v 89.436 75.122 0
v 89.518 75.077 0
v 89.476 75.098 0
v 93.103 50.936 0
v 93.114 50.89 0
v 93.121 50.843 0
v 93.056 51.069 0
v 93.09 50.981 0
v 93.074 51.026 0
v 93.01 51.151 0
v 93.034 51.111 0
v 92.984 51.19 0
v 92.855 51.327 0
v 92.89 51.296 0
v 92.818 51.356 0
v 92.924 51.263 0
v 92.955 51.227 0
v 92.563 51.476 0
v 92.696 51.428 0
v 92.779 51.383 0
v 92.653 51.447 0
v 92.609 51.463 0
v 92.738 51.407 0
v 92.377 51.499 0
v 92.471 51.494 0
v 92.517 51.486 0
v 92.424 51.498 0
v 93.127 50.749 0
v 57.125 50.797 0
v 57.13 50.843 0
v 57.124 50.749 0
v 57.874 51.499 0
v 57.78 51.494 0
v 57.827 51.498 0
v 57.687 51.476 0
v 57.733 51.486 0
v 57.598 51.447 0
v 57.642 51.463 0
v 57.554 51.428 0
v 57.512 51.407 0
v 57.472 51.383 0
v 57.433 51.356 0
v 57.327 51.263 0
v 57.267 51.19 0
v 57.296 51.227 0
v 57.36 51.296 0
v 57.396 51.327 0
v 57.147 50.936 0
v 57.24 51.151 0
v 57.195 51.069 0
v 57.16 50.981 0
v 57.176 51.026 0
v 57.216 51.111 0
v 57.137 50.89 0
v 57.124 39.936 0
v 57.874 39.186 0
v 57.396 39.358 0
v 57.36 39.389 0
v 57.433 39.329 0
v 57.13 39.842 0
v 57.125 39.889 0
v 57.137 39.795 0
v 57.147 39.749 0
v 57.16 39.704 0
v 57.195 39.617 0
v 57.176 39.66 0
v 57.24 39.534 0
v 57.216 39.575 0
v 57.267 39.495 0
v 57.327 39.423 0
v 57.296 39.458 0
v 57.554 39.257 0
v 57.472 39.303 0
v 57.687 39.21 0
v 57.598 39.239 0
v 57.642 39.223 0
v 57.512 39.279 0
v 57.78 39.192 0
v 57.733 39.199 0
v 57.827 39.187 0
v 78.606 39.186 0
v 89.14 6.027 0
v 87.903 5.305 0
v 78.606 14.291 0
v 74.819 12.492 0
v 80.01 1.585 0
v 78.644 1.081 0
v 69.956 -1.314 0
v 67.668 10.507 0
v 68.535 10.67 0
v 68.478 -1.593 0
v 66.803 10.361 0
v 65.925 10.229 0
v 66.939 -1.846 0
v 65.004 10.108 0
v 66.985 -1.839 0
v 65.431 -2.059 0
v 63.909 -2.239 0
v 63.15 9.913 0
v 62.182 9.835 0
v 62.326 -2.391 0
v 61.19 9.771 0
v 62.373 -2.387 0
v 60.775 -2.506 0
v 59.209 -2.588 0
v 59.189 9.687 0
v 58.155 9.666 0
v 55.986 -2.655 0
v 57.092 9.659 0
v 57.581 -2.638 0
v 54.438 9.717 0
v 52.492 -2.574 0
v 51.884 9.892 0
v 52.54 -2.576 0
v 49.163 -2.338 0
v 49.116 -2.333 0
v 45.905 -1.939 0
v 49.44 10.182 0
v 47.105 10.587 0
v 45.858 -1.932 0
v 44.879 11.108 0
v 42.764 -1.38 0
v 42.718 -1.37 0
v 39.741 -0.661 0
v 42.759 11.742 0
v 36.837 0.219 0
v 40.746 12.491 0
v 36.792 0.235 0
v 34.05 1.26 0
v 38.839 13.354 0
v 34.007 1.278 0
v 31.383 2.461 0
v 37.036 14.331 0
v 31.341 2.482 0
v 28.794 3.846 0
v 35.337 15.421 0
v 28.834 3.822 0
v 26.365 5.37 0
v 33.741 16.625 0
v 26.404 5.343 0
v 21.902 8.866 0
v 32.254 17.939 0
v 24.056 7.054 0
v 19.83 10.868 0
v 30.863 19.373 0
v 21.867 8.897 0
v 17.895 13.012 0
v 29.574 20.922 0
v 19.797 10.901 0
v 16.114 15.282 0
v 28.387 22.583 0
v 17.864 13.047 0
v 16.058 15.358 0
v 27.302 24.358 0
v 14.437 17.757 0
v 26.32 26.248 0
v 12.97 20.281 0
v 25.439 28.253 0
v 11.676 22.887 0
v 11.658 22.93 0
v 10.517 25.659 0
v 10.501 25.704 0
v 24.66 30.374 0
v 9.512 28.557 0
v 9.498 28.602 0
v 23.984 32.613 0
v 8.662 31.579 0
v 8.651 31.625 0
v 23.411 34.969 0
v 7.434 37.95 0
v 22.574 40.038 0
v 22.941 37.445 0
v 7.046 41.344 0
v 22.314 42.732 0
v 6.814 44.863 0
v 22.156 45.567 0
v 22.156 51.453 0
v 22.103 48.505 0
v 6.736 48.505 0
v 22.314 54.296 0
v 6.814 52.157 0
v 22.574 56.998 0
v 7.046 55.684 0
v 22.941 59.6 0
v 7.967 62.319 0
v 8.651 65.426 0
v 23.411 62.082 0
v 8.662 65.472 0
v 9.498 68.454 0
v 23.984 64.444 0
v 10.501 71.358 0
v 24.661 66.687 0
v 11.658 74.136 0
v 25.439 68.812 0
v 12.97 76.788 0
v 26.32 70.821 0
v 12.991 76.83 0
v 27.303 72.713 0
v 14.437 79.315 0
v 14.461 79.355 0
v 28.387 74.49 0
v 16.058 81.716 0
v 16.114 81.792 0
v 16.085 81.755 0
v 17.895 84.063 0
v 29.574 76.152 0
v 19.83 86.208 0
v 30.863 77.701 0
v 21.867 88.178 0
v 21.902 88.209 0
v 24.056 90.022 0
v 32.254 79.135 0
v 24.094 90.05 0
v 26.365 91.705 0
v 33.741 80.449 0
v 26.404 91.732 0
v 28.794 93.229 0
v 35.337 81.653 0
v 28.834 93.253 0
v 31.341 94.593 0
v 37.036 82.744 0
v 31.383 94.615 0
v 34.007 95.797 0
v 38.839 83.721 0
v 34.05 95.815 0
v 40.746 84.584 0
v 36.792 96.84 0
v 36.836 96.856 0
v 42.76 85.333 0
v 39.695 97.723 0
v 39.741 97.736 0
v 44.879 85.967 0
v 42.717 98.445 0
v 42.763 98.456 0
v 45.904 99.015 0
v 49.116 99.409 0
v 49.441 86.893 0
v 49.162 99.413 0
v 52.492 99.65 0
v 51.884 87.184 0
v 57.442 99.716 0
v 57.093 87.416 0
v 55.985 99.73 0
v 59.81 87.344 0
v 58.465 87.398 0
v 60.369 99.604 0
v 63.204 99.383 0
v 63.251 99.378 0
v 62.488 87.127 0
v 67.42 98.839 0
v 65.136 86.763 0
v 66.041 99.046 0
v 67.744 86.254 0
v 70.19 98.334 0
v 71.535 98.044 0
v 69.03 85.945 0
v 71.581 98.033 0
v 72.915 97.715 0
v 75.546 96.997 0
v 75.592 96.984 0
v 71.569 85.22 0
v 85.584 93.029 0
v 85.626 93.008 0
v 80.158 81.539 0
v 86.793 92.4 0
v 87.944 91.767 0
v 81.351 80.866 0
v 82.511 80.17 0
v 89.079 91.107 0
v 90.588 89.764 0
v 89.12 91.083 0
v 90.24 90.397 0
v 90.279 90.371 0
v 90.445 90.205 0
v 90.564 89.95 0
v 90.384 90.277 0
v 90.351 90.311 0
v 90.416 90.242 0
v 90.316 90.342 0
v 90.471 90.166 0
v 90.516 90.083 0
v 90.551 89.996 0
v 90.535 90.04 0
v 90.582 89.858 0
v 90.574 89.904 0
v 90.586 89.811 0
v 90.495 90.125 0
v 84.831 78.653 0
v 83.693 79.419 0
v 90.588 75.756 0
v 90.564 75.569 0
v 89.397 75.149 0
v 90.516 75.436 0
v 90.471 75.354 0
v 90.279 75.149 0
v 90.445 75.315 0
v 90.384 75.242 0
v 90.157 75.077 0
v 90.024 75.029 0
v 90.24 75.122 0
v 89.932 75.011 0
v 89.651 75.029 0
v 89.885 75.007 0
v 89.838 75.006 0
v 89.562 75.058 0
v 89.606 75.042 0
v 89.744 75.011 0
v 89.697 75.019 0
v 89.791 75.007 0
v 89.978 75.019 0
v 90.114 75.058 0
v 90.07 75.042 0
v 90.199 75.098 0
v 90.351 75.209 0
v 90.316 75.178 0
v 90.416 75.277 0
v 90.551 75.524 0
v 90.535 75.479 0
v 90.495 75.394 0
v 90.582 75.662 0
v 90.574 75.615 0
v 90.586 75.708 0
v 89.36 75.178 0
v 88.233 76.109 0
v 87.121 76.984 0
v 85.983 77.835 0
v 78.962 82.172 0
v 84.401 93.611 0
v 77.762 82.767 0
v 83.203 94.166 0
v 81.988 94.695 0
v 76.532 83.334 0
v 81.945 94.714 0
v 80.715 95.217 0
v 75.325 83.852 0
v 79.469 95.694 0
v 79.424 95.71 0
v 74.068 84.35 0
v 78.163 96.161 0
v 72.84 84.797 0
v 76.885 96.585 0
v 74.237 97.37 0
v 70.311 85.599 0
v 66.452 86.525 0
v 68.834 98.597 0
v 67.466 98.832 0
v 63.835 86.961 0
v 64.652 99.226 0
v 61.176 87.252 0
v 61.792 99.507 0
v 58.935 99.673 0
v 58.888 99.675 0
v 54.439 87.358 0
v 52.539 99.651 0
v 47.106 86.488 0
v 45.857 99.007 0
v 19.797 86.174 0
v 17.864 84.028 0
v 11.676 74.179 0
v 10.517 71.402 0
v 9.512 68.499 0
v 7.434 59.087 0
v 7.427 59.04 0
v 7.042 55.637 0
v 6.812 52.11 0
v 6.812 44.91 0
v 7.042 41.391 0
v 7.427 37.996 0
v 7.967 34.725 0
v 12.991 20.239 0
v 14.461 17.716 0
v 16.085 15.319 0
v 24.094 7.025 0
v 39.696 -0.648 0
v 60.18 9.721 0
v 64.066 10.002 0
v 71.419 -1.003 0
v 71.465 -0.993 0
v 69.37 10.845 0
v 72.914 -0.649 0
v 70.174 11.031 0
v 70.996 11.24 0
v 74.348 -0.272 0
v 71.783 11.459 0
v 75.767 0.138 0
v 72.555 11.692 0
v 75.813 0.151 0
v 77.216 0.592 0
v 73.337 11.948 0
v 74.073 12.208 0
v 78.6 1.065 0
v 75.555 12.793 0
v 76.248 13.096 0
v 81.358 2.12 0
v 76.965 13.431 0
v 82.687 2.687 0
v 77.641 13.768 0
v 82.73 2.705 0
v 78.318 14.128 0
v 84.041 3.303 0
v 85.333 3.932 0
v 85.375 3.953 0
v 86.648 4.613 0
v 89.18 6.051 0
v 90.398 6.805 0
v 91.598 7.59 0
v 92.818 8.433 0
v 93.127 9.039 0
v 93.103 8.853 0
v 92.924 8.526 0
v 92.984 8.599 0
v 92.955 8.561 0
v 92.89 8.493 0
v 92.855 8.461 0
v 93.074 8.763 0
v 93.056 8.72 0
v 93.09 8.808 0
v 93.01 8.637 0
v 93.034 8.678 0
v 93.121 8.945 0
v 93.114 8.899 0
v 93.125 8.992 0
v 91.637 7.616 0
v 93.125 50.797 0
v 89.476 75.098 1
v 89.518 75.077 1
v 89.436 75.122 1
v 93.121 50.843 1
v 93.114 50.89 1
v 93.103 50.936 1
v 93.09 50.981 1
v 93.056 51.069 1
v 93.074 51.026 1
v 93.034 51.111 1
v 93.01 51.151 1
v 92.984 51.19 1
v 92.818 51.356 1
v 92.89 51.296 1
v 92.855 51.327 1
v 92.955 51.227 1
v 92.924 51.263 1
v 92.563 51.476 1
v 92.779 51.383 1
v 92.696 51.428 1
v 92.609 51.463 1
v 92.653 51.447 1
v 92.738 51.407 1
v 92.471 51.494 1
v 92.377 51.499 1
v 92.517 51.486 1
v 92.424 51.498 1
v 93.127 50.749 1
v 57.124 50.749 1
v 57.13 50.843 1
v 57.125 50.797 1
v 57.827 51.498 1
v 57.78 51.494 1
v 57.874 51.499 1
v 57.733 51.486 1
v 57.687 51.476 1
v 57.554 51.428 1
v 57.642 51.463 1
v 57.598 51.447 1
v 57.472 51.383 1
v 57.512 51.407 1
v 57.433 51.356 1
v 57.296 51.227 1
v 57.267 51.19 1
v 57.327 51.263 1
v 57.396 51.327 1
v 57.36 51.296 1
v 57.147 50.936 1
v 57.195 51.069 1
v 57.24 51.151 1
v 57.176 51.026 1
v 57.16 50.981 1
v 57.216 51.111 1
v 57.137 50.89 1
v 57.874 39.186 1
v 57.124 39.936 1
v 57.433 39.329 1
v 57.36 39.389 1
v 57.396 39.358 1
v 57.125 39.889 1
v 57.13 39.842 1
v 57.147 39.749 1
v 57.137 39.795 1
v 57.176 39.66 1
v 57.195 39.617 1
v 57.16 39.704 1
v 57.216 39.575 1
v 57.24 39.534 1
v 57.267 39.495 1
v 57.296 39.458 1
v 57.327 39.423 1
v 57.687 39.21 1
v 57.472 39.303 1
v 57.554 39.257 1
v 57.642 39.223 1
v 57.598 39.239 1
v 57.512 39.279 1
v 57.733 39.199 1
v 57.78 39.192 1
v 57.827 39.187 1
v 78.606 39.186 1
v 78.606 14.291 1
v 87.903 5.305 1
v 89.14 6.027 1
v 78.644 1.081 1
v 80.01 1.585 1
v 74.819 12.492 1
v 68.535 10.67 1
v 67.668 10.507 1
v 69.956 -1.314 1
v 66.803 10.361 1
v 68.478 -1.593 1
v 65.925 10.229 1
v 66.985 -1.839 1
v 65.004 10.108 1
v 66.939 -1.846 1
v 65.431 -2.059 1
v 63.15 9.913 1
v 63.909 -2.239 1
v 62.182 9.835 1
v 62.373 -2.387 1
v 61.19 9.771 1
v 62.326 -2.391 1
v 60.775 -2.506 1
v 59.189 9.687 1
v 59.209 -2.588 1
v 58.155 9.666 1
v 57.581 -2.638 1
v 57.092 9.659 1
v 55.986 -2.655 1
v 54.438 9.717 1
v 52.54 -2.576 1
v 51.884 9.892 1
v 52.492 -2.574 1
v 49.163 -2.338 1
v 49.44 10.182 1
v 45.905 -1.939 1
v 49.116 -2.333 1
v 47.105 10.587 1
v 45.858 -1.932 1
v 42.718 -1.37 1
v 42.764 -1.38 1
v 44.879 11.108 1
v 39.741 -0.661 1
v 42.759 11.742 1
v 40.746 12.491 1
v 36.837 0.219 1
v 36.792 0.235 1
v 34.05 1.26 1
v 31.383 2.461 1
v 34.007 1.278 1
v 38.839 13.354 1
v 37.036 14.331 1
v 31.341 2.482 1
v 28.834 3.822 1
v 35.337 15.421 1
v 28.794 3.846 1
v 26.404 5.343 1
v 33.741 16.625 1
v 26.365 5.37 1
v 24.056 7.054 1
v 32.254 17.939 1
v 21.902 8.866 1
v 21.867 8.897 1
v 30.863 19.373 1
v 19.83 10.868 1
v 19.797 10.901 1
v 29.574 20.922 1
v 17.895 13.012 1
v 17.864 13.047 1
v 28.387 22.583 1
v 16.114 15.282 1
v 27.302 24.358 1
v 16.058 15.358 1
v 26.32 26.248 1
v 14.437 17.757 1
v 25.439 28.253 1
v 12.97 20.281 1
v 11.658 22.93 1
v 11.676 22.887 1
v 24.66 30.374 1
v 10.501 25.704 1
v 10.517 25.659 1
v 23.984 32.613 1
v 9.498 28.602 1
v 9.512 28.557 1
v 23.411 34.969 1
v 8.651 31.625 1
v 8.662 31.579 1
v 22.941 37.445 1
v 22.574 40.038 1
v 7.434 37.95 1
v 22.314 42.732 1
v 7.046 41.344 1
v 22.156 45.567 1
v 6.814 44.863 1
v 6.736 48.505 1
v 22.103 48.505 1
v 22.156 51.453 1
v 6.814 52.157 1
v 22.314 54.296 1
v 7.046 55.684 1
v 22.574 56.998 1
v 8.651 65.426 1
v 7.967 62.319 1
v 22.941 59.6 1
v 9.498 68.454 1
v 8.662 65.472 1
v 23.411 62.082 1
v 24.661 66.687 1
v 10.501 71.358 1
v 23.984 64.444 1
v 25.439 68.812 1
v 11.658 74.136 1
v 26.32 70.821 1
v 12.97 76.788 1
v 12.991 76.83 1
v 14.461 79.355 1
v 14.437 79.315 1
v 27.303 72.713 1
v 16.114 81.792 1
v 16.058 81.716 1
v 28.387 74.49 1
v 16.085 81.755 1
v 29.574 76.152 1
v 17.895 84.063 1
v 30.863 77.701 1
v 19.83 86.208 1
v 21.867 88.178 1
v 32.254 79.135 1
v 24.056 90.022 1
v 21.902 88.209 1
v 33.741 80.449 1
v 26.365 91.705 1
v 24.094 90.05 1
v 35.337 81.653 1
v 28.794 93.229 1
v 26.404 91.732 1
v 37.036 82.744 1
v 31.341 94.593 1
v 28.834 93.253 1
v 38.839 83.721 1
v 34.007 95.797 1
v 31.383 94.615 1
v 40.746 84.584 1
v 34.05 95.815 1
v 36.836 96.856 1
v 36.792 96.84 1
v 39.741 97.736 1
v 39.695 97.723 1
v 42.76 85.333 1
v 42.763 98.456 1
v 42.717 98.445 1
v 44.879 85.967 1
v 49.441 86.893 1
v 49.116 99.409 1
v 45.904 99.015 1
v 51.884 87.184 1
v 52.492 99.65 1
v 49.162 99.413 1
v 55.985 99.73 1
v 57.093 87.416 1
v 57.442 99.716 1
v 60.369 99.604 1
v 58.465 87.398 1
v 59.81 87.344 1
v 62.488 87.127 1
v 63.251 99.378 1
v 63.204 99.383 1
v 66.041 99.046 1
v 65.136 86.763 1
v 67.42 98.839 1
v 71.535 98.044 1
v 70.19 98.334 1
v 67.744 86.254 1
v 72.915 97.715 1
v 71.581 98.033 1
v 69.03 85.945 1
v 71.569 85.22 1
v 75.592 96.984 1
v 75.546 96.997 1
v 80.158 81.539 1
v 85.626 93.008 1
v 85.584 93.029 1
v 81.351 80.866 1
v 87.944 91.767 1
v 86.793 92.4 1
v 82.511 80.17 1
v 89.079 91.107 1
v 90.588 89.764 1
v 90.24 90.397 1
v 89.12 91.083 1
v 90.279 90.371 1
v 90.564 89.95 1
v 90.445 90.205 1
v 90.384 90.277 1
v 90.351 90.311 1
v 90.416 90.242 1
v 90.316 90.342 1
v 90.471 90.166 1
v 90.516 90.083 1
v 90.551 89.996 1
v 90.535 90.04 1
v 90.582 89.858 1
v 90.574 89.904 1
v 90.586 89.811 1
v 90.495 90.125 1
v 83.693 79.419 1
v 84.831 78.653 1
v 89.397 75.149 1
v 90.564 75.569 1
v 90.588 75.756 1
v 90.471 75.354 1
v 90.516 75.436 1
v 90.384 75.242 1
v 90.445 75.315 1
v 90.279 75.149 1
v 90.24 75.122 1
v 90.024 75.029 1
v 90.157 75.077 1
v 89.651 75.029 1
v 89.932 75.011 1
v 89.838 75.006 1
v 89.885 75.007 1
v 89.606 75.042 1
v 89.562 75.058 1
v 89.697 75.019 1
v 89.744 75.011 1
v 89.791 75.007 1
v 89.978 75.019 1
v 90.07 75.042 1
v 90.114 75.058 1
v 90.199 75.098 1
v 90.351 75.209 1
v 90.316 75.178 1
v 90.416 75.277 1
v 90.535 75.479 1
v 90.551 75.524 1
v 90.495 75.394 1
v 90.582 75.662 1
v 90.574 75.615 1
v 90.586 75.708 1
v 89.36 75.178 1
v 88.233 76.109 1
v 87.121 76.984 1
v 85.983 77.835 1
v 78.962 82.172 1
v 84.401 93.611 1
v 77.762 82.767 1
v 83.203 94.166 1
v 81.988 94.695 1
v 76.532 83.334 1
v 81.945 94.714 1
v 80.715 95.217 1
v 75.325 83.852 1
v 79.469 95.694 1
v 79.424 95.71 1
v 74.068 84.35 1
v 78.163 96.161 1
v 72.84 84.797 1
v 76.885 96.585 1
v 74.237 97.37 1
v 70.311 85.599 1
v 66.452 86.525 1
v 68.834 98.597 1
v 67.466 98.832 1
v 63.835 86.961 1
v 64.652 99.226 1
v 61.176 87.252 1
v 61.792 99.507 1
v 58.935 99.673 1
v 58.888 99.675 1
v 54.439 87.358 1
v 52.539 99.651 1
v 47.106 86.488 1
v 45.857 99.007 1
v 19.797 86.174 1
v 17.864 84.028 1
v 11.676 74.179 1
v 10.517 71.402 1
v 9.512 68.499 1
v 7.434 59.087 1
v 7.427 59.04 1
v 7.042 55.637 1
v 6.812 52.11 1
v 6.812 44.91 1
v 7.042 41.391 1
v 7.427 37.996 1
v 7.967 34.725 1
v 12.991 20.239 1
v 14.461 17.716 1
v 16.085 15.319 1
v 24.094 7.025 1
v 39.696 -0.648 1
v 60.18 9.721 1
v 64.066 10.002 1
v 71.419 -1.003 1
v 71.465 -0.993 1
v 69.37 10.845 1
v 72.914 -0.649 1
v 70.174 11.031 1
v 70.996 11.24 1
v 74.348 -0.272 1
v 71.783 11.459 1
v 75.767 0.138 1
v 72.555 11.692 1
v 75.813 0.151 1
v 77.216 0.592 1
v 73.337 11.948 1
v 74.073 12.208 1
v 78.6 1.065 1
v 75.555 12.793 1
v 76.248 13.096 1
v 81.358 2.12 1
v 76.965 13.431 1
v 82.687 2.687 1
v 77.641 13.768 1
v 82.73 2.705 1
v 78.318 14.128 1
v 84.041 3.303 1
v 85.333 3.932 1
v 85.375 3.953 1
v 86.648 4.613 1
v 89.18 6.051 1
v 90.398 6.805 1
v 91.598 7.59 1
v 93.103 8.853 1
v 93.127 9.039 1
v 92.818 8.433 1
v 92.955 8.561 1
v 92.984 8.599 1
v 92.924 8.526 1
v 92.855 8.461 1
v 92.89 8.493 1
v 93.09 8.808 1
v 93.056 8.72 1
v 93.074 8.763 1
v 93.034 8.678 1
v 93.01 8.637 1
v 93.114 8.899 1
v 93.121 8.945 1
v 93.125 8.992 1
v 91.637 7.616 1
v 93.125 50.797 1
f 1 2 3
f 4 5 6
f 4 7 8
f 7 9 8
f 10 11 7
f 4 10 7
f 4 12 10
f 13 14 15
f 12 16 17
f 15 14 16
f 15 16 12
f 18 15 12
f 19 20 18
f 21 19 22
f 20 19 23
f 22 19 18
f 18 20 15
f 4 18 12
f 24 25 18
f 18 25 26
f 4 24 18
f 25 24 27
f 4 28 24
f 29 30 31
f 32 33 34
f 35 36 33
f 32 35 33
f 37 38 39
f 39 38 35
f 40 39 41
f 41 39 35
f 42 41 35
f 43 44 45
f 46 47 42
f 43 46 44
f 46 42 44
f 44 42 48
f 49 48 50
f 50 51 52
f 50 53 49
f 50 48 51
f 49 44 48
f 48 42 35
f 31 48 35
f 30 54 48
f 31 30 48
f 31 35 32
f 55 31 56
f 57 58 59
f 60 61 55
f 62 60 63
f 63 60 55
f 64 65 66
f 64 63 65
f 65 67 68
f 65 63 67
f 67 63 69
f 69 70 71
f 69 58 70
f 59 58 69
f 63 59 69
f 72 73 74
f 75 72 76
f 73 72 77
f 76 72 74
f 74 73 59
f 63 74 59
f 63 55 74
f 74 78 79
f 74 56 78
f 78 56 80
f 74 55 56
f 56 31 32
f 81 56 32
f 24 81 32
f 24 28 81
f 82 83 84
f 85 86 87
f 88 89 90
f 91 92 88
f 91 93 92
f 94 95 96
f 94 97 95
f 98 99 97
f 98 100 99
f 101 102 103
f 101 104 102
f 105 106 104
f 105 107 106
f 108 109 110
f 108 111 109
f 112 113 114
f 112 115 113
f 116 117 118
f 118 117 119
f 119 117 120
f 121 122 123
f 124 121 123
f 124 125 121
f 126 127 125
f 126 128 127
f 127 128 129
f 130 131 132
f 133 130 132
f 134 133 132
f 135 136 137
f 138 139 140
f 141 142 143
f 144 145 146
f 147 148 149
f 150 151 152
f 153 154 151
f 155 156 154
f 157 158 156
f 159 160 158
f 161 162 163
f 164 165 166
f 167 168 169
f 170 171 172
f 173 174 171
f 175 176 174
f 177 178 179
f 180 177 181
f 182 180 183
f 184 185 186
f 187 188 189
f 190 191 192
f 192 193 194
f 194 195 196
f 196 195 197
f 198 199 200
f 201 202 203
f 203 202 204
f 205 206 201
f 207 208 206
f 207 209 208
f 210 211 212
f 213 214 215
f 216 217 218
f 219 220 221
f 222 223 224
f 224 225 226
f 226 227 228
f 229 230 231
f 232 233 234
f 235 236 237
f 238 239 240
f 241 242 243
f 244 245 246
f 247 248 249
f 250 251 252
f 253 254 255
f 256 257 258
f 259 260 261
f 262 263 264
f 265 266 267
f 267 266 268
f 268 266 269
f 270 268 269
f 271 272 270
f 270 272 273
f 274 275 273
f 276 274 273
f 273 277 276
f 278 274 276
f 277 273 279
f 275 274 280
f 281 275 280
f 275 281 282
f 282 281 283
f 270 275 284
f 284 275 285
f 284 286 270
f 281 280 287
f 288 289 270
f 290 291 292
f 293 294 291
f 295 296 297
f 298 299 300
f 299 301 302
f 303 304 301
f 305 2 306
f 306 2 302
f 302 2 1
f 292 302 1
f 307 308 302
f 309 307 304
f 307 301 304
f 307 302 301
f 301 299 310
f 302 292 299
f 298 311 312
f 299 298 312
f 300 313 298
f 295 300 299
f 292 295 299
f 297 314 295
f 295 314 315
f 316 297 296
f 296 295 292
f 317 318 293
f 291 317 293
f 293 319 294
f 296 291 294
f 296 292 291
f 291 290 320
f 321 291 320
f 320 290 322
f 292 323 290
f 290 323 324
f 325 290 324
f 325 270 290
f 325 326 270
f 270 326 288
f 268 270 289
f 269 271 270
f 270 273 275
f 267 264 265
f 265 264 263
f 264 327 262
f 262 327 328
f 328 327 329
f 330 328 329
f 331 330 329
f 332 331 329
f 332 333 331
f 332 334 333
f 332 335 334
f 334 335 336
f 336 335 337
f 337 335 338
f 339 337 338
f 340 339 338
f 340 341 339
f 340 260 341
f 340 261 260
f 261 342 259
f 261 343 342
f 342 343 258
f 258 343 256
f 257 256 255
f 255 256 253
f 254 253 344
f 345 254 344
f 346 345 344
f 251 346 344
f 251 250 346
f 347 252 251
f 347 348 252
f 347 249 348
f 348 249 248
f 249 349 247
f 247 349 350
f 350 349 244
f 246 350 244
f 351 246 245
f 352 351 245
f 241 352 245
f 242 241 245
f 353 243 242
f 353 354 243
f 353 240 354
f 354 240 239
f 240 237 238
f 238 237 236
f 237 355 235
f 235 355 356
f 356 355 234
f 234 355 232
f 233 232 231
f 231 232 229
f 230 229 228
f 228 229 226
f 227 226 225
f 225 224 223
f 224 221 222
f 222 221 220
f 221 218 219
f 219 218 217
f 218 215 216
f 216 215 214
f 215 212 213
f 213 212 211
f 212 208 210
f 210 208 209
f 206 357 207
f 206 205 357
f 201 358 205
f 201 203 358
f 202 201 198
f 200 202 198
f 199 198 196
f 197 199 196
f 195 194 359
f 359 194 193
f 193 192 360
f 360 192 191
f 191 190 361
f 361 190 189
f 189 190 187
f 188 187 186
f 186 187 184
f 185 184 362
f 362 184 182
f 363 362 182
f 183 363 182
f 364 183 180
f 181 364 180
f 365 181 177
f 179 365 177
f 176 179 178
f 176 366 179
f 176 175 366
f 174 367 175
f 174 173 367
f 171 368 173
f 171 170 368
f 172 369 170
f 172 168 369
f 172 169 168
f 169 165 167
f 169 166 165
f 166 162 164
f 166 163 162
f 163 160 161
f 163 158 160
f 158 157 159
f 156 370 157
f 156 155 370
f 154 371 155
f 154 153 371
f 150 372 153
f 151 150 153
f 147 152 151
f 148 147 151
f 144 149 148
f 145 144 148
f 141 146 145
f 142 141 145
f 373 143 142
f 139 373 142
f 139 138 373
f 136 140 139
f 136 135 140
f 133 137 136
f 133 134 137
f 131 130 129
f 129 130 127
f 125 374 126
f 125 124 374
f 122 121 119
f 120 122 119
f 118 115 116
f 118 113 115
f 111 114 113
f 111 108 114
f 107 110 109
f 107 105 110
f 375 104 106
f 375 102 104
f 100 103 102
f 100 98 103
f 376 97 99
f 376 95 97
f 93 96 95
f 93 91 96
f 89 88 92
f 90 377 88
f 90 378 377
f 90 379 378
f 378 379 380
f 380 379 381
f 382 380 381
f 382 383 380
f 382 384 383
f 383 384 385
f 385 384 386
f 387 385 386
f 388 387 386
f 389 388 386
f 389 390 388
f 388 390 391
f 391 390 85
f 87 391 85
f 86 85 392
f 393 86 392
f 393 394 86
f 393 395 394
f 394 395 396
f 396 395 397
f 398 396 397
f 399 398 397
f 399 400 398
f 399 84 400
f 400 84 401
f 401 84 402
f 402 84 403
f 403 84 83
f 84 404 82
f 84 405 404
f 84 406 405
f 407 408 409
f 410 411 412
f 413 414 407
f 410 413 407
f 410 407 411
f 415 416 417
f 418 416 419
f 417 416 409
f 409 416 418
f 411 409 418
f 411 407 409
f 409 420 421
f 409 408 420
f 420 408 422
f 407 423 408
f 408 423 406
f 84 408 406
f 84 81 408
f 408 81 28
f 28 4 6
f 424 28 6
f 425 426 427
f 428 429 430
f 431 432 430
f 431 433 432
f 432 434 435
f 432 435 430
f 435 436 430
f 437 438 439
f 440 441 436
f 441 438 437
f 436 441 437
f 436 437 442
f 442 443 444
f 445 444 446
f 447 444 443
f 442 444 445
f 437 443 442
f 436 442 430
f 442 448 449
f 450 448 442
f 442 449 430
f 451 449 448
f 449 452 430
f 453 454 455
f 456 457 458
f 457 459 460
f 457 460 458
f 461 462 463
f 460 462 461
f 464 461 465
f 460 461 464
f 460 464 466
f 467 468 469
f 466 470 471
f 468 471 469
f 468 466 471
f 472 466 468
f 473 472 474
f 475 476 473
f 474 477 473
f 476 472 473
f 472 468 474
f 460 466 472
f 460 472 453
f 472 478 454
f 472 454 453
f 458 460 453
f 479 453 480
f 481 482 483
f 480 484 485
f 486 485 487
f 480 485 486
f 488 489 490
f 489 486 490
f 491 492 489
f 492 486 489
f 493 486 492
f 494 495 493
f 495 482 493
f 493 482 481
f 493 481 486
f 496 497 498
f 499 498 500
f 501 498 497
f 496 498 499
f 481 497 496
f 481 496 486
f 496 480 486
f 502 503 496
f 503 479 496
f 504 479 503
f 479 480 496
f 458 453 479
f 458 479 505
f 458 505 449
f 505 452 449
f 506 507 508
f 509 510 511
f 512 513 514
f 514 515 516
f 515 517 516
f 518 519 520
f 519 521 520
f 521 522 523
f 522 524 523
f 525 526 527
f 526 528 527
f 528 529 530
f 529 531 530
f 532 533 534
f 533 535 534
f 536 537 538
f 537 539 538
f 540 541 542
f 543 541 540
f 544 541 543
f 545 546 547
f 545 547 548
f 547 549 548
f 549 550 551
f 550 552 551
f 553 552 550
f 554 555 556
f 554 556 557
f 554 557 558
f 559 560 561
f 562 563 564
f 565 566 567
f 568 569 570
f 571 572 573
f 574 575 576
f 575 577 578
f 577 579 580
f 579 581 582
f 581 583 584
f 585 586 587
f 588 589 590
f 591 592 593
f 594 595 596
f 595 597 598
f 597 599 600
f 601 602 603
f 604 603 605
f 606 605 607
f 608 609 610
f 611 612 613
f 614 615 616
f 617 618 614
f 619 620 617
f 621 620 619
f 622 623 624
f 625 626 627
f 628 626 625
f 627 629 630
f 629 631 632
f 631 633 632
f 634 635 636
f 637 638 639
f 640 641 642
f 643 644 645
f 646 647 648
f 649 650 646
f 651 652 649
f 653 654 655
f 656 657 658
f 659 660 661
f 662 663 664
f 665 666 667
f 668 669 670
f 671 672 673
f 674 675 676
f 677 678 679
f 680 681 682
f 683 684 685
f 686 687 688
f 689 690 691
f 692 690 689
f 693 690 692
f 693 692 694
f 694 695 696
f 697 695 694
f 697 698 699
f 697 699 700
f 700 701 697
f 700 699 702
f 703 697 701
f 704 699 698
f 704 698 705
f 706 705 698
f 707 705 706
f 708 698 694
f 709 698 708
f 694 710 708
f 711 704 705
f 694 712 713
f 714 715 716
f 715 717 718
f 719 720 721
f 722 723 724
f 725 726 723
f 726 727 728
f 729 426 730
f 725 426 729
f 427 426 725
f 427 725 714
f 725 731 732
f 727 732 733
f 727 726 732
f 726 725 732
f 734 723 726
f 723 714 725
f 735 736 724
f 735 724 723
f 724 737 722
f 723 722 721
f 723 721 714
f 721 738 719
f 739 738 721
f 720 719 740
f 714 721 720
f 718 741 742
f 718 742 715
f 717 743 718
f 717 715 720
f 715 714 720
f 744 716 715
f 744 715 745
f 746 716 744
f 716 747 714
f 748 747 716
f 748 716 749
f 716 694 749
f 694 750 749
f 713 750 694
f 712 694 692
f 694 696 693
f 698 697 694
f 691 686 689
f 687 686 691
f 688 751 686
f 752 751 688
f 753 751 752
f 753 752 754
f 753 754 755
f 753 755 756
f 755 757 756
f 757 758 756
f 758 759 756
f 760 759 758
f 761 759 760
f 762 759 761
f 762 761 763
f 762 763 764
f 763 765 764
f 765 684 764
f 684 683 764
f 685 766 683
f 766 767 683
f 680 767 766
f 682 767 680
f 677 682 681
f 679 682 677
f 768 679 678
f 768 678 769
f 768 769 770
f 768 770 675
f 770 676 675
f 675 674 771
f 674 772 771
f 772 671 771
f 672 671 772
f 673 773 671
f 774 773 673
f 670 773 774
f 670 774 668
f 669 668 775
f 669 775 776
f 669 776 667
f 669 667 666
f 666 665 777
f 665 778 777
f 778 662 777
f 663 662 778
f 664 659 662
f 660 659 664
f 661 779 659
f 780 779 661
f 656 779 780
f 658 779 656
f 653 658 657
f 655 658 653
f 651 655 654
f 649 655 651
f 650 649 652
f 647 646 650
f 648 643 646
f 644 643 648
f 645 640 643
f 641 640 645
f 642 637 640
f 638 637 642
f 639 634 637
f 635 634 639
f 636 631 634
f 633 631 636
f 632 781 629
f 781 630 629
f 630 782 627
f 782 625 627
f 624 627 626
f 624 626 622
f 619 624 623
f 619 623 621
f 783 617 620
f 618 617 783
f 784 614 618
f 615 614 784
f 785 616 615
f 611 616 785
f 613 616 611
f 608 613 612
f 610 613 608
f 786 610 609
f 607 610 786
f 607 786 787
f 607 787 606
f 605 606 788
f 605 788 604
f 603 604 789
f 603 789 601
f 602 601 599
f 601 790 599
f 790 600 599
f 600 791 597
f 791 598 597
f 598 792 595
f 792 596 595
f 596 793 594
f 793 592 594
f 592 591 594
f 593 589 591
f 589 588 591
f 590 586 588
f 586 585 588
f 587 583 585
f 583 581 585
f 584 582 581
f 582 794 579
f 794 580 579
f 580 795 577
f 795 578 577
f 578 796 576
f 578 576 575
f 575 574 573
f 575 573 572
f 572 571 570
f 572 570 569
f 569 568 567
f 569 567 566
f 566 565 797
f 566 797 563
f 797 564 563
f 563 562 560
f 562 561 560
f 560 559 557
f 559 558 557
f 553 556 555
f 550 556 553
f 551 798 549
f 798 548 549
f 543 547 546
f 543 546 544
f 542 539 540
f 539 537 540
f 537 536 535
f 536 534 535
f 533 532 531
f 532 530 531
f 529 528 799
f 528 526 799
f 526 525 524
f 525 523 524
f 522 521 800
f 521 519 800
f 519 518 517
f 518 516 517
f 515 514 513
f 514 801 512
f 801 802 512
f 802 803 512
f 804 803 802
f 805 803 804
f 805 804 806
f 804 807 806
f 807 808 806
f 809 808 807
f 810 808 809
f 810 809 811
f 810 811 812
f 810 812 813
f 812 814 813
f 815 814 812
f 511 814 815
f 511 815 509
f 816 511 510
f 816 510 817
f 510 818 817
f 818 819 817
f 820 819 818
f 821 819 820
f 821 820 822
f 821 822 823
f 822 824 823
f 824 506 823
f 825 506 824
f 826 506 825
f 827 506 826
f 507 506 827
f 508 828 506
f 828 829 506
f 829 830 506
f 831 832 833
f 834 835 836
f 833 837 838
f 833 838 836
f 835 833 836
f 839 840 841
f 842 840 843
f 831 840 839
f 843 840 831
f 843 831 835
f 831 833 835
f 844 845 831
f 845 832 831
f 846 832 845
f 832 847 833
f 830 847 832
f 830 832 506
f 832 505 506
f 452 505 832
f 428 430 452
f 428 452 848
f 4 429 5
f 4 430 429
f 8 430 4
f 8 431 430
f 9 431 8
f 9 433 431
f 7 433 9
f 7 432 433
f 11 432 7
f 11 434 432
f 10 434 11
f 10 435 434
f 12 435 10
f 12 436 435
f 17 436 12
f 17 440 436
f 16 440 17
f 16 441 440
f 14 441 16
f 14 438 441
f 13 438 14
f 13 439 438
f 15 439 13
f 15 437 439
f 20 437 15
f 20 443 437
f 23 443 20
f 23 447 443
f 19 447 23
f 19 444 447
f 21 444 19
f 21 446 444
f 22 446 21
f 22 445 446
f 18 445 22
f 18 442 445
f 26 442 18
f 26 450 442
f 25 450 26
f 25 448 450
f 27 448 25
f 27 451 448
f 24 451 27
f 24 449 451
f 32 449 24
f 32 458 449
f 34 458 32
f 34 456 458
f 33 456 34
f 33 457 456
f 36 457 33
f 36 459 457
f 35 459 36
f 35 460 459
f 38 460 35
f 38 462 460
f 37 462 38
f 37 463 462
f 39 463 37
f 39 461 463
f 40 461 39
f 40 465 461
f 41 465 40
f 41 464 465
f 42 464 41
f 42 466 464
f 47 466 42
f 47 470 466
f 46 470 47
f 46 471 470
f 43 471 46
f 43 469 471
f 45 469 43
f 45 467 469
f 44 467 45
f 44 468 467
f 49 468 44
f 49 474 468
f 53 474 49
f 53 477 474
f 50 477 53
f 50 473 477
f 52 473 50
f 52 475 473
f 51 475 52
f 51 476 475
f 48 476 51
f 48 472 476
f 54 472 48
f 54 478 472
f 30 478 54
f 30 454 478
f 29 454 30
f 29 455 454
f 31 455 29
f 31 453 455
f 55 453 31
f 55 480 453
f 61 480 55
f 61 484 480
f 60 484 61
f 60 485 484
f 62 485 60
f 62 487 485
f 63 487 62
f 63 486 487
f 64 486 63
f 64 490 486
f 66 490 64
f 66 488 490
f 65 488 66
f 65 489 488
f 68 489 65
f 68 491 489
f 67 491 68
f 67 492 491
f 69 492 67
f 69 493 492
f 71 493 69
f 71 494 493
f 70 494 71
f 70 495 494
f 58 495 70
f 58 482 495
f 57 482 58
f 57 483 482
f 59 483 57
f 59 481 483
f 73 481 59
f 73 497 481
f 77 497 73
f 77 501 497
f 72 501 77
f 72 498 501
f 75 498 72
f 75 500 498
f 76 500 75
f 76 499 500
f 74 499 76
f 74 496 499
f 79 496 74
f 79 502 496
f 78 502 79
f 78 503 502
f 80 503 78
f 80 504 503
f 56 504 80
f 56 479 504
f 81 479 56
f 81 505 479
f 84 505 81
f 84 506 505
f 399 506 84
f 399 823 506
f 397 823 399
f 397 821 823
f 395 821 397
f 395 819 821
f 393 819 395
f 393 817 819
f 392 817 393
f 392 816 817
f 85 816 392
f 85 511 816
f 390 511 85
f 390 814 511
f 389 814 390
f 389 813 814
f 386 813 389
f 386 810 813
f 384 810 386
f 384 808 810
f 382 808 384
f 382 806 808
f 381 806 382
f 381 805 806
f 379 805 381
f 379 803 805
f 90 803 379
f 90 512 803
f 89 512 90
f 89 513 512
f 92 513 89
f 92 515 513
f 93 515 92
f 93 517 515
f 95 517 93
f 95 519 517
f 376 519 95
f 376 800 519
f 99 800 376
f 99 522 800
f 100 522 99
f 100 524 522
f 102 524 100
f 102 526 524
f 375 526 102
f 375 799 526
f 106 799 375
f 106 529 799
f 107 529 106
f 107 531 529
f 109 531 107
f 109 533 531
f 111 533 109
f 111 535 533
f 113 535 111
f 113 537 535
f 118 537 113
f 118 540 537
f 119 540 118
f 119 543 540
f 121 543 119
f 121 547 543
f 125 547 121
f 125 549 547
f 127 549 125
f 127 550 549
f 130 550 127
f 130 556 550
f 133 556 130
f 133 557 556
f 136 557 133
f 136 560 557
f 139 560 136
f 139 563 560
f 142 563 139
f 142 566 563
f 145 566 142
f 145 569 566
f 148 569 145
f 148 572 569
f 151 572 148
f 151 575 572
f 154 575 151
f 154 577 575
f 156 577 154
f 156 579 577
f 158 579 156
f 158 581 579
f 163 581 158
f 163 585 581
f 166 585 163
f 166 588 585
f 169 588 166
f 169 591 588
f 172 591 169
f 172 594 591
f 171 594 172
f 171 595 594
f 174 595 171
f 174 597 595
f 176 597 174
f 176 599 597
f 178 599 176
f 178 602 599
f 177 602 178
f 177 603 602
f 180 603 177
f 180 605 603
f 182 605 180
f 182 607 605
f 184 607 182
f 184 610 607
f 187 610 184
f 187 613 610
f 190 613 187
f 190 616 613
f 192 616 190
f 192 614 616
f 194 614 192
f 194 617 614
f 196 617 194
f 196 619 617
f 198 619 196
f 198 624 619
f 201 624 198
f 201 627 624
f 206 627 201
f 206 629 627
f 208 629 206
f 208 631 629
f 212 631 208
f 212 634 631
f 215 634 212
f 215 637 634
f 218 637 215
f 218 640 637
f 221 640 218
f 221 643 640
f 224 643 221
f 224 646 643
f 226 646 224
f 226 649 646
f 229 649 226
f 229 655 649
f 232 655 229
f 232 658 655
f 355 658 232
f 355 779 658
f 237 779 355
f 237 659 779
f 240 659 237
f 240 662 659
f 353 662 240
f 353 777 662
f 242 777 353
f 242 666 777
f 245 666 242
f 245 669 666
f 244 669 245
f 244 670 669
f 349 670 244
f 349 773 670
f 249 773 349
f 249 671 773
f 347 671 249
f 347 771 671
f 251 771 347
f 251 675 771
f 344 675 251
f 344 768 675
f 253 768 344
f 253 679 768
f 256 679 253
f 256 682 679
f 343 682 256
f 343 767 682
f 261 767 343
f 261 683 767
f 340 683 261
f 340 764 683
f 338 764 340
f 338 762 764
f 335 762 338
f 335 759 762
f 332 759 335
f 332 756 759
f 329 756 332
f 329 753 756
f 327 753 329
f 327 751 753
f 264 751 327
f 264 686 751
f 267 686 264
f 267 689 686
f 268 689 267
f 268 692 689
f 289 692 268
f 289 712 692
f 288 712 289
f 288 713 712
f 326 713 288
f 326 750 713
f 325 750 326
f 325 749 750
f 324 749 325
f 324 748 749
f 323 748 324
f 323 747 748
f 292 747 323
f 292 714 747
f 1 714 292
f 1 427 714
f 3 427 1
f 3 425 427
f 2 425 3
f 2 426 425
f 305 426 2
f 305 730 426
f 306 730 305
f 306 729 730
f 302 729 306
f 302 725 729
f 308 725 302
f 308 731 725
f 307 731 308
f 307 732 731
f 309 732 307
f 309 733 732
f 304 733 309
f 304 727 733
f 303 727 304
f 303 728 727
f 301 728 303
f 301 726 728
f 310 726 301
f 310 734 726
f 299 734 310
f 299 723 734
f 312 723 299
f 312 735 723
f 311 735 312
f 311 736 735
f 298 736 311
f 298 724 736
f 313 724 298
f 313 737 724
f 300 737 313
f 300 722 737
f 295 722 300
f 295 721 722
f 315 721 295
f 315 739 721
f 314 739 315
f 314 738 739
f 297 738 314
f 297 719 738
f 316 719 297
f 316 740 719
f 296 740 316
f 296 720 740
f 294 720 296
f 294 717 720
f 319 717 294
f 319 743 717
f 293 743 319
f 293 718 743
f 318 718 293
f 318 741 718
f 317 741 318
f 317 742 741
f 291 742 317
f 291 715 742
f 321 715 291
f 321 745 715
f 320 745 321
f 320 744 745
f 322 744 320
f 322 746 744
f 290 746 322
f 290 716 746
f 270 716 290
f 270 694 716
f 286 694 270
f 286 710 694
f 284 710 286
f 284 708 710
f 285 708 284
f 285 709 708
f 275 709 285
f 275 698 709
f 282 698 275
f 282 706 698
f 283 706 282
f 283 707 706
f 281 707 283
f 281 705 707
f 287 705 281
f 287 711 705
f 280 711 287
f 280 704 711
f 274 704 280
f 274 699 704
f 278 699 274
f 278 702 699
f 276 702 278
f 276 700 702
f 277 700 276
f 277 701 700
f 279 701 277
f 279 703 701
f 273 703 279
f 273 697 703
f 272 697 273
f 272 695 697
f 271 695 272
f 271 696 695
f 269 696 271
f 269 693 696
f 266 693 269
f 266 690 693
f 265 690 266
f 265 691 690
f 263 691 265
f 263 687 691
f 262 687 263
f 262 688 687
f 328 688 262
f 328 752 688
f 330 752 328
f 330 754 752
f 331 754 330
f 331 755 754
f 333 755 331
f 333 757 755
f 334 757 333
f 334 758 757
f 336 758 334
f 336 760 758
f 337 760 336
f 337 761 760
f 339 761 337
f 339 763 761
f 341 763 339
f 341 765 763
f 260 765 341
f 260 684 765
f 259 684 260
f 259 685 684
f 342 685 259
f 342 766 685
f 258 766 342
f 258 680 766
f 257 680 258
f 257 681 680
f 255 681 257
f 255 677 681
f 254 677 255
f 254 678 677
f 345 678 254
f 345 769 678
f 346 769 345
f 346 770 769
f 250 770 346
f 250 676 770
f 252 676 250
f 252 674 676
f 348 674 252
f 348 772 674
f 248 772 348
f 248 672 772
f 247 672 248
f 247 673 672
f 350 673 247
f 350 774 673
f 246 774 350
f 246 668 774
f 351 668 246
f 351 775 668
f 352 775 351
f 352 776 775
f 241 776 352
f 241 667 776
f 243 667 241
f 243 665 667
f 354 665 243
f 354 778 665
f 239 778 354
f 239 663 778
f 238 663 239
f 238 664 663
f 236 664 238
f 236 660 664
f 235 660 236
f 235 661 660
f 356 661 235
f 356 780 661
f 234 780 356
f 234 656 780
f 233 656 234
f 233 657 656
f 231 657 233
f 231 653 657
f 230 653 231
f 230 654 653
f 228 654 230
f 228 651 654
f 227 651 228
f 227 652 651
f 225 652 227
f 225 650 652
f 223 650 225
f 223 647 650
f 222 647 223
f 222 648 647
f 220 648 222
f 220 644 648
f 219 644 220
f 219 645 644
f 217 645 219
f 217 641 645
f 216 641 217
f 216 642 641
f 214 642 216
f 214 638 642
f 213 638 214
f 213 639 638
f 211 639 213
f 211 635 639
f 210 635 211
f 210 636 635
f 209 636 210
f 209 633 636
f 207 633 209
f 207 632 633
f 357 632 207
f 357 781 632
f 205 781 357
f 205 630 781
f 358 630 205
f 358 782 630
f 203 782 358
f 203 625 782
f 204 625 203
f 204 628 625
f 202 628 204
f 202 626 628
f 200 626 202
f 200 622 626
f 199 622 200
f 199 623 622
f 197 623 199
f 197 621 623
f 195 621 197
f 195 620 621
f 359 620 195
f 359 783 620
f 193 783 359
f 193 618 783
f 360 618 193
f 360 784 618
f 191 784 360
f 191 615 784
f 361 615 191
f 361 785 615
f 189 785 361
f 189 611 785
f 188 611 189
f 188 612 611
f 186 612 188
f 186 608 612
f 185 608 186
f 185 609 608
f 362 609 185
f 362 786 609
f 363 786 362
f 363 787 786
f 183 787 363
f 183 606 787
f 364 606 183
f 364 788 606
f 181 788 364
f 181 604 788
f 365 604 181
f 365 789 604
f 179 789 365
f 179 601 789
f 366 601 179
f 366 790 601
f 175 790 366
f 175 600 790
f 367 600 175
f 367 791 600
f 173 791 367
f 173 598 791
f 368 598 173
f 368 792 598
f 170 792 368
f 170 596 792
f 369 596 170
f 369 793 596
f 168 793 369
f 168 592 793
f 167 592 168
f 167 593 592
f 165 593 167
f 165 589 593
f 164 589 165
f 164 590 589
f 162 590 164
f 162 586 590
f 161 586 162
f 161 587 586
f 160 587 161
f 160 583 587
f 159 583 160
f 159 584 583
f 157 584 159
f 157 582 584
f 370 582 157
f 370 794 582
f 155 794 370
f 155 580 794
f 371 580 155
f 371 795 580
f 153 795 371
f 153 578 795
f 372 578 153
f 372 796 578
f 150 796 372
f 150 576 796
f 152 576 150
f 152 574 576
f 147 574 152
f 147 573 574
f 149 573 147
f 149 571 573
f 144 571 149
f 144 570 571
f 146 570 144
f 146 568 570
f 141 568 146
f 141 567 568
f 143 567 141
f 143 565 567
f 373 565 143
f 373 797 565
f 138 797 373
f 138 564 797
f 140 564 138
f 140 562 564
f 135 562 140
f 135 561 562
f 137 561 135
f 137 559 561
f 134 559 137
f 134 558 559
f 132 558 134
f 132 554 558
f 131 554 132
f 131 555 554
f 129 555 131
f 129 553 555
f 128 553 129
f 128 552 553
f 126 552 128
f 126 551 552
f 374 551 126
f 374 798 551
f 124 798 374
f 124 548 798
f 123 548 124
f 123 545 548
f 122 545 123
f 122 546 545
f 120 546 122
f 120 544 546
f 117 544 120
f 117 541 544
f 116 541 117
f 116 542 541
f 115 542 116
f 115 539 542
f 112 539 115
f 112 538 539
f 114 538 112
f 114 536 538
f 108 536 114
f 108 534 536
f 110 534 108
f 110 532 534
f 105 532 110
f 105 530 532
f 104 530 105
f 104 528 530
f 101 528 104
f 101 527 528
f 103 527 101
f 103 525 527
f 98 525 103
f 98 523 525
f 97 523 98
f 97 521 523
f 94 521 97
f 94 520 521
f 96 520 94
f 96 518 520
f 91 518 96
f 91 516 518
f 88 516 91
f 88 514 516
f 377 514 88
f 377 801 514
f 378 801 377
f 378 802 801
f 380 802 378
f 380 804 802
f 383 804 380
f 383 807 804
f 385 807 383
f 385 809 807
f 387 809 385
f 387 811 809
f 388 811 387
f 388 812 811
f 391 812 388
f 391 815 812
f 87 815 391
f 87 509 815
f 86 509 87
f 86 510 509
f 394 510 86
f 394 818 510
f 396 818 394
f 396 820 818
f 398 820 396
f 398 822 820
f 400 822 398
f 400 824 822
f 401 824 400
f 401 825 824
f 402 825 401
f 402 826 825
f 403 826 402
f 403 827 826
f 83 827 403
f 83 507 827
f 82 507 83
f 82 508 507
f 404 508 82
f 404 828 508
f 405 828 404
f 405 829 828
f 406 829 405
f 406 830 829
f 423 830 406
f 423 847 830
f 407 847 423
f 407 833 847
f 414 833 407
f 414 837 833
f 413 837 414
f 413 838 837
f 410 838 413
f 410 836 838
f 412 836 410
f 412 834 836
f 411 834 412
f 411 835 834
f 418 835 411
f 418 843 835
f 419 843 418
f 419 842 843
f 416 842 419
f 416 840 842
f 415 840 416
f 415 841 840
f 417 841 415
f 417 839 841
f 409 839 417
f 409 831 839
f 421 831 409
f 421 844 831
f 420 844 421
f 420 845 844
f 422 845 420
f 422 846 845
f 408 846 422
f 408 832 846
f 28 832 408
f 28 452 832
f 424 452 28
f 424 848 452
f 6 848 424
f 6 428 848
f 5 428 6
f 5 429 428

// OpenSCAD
//Sign front-face generator V3 - bigclivedotcom
//All variables must match the sign body sizes
letter = "G"; //Sign character to make
style = "Noto Mono"; //See "Help" and "Font List"
size = 100; //Size of character
$fn=100; //Curve facets - higher is smoother
walls = 2; //Side wall thickness
face = 1; //Face thickness
fit = 0.5; //Slight shrink of face for easier fitting
//Don't change variables below here
sized=size-(2*walls);
linear_extrude(height=face)
minkowski(){
     text(letter,sized,style);
     circle((walls/2)-fit/2);
}
